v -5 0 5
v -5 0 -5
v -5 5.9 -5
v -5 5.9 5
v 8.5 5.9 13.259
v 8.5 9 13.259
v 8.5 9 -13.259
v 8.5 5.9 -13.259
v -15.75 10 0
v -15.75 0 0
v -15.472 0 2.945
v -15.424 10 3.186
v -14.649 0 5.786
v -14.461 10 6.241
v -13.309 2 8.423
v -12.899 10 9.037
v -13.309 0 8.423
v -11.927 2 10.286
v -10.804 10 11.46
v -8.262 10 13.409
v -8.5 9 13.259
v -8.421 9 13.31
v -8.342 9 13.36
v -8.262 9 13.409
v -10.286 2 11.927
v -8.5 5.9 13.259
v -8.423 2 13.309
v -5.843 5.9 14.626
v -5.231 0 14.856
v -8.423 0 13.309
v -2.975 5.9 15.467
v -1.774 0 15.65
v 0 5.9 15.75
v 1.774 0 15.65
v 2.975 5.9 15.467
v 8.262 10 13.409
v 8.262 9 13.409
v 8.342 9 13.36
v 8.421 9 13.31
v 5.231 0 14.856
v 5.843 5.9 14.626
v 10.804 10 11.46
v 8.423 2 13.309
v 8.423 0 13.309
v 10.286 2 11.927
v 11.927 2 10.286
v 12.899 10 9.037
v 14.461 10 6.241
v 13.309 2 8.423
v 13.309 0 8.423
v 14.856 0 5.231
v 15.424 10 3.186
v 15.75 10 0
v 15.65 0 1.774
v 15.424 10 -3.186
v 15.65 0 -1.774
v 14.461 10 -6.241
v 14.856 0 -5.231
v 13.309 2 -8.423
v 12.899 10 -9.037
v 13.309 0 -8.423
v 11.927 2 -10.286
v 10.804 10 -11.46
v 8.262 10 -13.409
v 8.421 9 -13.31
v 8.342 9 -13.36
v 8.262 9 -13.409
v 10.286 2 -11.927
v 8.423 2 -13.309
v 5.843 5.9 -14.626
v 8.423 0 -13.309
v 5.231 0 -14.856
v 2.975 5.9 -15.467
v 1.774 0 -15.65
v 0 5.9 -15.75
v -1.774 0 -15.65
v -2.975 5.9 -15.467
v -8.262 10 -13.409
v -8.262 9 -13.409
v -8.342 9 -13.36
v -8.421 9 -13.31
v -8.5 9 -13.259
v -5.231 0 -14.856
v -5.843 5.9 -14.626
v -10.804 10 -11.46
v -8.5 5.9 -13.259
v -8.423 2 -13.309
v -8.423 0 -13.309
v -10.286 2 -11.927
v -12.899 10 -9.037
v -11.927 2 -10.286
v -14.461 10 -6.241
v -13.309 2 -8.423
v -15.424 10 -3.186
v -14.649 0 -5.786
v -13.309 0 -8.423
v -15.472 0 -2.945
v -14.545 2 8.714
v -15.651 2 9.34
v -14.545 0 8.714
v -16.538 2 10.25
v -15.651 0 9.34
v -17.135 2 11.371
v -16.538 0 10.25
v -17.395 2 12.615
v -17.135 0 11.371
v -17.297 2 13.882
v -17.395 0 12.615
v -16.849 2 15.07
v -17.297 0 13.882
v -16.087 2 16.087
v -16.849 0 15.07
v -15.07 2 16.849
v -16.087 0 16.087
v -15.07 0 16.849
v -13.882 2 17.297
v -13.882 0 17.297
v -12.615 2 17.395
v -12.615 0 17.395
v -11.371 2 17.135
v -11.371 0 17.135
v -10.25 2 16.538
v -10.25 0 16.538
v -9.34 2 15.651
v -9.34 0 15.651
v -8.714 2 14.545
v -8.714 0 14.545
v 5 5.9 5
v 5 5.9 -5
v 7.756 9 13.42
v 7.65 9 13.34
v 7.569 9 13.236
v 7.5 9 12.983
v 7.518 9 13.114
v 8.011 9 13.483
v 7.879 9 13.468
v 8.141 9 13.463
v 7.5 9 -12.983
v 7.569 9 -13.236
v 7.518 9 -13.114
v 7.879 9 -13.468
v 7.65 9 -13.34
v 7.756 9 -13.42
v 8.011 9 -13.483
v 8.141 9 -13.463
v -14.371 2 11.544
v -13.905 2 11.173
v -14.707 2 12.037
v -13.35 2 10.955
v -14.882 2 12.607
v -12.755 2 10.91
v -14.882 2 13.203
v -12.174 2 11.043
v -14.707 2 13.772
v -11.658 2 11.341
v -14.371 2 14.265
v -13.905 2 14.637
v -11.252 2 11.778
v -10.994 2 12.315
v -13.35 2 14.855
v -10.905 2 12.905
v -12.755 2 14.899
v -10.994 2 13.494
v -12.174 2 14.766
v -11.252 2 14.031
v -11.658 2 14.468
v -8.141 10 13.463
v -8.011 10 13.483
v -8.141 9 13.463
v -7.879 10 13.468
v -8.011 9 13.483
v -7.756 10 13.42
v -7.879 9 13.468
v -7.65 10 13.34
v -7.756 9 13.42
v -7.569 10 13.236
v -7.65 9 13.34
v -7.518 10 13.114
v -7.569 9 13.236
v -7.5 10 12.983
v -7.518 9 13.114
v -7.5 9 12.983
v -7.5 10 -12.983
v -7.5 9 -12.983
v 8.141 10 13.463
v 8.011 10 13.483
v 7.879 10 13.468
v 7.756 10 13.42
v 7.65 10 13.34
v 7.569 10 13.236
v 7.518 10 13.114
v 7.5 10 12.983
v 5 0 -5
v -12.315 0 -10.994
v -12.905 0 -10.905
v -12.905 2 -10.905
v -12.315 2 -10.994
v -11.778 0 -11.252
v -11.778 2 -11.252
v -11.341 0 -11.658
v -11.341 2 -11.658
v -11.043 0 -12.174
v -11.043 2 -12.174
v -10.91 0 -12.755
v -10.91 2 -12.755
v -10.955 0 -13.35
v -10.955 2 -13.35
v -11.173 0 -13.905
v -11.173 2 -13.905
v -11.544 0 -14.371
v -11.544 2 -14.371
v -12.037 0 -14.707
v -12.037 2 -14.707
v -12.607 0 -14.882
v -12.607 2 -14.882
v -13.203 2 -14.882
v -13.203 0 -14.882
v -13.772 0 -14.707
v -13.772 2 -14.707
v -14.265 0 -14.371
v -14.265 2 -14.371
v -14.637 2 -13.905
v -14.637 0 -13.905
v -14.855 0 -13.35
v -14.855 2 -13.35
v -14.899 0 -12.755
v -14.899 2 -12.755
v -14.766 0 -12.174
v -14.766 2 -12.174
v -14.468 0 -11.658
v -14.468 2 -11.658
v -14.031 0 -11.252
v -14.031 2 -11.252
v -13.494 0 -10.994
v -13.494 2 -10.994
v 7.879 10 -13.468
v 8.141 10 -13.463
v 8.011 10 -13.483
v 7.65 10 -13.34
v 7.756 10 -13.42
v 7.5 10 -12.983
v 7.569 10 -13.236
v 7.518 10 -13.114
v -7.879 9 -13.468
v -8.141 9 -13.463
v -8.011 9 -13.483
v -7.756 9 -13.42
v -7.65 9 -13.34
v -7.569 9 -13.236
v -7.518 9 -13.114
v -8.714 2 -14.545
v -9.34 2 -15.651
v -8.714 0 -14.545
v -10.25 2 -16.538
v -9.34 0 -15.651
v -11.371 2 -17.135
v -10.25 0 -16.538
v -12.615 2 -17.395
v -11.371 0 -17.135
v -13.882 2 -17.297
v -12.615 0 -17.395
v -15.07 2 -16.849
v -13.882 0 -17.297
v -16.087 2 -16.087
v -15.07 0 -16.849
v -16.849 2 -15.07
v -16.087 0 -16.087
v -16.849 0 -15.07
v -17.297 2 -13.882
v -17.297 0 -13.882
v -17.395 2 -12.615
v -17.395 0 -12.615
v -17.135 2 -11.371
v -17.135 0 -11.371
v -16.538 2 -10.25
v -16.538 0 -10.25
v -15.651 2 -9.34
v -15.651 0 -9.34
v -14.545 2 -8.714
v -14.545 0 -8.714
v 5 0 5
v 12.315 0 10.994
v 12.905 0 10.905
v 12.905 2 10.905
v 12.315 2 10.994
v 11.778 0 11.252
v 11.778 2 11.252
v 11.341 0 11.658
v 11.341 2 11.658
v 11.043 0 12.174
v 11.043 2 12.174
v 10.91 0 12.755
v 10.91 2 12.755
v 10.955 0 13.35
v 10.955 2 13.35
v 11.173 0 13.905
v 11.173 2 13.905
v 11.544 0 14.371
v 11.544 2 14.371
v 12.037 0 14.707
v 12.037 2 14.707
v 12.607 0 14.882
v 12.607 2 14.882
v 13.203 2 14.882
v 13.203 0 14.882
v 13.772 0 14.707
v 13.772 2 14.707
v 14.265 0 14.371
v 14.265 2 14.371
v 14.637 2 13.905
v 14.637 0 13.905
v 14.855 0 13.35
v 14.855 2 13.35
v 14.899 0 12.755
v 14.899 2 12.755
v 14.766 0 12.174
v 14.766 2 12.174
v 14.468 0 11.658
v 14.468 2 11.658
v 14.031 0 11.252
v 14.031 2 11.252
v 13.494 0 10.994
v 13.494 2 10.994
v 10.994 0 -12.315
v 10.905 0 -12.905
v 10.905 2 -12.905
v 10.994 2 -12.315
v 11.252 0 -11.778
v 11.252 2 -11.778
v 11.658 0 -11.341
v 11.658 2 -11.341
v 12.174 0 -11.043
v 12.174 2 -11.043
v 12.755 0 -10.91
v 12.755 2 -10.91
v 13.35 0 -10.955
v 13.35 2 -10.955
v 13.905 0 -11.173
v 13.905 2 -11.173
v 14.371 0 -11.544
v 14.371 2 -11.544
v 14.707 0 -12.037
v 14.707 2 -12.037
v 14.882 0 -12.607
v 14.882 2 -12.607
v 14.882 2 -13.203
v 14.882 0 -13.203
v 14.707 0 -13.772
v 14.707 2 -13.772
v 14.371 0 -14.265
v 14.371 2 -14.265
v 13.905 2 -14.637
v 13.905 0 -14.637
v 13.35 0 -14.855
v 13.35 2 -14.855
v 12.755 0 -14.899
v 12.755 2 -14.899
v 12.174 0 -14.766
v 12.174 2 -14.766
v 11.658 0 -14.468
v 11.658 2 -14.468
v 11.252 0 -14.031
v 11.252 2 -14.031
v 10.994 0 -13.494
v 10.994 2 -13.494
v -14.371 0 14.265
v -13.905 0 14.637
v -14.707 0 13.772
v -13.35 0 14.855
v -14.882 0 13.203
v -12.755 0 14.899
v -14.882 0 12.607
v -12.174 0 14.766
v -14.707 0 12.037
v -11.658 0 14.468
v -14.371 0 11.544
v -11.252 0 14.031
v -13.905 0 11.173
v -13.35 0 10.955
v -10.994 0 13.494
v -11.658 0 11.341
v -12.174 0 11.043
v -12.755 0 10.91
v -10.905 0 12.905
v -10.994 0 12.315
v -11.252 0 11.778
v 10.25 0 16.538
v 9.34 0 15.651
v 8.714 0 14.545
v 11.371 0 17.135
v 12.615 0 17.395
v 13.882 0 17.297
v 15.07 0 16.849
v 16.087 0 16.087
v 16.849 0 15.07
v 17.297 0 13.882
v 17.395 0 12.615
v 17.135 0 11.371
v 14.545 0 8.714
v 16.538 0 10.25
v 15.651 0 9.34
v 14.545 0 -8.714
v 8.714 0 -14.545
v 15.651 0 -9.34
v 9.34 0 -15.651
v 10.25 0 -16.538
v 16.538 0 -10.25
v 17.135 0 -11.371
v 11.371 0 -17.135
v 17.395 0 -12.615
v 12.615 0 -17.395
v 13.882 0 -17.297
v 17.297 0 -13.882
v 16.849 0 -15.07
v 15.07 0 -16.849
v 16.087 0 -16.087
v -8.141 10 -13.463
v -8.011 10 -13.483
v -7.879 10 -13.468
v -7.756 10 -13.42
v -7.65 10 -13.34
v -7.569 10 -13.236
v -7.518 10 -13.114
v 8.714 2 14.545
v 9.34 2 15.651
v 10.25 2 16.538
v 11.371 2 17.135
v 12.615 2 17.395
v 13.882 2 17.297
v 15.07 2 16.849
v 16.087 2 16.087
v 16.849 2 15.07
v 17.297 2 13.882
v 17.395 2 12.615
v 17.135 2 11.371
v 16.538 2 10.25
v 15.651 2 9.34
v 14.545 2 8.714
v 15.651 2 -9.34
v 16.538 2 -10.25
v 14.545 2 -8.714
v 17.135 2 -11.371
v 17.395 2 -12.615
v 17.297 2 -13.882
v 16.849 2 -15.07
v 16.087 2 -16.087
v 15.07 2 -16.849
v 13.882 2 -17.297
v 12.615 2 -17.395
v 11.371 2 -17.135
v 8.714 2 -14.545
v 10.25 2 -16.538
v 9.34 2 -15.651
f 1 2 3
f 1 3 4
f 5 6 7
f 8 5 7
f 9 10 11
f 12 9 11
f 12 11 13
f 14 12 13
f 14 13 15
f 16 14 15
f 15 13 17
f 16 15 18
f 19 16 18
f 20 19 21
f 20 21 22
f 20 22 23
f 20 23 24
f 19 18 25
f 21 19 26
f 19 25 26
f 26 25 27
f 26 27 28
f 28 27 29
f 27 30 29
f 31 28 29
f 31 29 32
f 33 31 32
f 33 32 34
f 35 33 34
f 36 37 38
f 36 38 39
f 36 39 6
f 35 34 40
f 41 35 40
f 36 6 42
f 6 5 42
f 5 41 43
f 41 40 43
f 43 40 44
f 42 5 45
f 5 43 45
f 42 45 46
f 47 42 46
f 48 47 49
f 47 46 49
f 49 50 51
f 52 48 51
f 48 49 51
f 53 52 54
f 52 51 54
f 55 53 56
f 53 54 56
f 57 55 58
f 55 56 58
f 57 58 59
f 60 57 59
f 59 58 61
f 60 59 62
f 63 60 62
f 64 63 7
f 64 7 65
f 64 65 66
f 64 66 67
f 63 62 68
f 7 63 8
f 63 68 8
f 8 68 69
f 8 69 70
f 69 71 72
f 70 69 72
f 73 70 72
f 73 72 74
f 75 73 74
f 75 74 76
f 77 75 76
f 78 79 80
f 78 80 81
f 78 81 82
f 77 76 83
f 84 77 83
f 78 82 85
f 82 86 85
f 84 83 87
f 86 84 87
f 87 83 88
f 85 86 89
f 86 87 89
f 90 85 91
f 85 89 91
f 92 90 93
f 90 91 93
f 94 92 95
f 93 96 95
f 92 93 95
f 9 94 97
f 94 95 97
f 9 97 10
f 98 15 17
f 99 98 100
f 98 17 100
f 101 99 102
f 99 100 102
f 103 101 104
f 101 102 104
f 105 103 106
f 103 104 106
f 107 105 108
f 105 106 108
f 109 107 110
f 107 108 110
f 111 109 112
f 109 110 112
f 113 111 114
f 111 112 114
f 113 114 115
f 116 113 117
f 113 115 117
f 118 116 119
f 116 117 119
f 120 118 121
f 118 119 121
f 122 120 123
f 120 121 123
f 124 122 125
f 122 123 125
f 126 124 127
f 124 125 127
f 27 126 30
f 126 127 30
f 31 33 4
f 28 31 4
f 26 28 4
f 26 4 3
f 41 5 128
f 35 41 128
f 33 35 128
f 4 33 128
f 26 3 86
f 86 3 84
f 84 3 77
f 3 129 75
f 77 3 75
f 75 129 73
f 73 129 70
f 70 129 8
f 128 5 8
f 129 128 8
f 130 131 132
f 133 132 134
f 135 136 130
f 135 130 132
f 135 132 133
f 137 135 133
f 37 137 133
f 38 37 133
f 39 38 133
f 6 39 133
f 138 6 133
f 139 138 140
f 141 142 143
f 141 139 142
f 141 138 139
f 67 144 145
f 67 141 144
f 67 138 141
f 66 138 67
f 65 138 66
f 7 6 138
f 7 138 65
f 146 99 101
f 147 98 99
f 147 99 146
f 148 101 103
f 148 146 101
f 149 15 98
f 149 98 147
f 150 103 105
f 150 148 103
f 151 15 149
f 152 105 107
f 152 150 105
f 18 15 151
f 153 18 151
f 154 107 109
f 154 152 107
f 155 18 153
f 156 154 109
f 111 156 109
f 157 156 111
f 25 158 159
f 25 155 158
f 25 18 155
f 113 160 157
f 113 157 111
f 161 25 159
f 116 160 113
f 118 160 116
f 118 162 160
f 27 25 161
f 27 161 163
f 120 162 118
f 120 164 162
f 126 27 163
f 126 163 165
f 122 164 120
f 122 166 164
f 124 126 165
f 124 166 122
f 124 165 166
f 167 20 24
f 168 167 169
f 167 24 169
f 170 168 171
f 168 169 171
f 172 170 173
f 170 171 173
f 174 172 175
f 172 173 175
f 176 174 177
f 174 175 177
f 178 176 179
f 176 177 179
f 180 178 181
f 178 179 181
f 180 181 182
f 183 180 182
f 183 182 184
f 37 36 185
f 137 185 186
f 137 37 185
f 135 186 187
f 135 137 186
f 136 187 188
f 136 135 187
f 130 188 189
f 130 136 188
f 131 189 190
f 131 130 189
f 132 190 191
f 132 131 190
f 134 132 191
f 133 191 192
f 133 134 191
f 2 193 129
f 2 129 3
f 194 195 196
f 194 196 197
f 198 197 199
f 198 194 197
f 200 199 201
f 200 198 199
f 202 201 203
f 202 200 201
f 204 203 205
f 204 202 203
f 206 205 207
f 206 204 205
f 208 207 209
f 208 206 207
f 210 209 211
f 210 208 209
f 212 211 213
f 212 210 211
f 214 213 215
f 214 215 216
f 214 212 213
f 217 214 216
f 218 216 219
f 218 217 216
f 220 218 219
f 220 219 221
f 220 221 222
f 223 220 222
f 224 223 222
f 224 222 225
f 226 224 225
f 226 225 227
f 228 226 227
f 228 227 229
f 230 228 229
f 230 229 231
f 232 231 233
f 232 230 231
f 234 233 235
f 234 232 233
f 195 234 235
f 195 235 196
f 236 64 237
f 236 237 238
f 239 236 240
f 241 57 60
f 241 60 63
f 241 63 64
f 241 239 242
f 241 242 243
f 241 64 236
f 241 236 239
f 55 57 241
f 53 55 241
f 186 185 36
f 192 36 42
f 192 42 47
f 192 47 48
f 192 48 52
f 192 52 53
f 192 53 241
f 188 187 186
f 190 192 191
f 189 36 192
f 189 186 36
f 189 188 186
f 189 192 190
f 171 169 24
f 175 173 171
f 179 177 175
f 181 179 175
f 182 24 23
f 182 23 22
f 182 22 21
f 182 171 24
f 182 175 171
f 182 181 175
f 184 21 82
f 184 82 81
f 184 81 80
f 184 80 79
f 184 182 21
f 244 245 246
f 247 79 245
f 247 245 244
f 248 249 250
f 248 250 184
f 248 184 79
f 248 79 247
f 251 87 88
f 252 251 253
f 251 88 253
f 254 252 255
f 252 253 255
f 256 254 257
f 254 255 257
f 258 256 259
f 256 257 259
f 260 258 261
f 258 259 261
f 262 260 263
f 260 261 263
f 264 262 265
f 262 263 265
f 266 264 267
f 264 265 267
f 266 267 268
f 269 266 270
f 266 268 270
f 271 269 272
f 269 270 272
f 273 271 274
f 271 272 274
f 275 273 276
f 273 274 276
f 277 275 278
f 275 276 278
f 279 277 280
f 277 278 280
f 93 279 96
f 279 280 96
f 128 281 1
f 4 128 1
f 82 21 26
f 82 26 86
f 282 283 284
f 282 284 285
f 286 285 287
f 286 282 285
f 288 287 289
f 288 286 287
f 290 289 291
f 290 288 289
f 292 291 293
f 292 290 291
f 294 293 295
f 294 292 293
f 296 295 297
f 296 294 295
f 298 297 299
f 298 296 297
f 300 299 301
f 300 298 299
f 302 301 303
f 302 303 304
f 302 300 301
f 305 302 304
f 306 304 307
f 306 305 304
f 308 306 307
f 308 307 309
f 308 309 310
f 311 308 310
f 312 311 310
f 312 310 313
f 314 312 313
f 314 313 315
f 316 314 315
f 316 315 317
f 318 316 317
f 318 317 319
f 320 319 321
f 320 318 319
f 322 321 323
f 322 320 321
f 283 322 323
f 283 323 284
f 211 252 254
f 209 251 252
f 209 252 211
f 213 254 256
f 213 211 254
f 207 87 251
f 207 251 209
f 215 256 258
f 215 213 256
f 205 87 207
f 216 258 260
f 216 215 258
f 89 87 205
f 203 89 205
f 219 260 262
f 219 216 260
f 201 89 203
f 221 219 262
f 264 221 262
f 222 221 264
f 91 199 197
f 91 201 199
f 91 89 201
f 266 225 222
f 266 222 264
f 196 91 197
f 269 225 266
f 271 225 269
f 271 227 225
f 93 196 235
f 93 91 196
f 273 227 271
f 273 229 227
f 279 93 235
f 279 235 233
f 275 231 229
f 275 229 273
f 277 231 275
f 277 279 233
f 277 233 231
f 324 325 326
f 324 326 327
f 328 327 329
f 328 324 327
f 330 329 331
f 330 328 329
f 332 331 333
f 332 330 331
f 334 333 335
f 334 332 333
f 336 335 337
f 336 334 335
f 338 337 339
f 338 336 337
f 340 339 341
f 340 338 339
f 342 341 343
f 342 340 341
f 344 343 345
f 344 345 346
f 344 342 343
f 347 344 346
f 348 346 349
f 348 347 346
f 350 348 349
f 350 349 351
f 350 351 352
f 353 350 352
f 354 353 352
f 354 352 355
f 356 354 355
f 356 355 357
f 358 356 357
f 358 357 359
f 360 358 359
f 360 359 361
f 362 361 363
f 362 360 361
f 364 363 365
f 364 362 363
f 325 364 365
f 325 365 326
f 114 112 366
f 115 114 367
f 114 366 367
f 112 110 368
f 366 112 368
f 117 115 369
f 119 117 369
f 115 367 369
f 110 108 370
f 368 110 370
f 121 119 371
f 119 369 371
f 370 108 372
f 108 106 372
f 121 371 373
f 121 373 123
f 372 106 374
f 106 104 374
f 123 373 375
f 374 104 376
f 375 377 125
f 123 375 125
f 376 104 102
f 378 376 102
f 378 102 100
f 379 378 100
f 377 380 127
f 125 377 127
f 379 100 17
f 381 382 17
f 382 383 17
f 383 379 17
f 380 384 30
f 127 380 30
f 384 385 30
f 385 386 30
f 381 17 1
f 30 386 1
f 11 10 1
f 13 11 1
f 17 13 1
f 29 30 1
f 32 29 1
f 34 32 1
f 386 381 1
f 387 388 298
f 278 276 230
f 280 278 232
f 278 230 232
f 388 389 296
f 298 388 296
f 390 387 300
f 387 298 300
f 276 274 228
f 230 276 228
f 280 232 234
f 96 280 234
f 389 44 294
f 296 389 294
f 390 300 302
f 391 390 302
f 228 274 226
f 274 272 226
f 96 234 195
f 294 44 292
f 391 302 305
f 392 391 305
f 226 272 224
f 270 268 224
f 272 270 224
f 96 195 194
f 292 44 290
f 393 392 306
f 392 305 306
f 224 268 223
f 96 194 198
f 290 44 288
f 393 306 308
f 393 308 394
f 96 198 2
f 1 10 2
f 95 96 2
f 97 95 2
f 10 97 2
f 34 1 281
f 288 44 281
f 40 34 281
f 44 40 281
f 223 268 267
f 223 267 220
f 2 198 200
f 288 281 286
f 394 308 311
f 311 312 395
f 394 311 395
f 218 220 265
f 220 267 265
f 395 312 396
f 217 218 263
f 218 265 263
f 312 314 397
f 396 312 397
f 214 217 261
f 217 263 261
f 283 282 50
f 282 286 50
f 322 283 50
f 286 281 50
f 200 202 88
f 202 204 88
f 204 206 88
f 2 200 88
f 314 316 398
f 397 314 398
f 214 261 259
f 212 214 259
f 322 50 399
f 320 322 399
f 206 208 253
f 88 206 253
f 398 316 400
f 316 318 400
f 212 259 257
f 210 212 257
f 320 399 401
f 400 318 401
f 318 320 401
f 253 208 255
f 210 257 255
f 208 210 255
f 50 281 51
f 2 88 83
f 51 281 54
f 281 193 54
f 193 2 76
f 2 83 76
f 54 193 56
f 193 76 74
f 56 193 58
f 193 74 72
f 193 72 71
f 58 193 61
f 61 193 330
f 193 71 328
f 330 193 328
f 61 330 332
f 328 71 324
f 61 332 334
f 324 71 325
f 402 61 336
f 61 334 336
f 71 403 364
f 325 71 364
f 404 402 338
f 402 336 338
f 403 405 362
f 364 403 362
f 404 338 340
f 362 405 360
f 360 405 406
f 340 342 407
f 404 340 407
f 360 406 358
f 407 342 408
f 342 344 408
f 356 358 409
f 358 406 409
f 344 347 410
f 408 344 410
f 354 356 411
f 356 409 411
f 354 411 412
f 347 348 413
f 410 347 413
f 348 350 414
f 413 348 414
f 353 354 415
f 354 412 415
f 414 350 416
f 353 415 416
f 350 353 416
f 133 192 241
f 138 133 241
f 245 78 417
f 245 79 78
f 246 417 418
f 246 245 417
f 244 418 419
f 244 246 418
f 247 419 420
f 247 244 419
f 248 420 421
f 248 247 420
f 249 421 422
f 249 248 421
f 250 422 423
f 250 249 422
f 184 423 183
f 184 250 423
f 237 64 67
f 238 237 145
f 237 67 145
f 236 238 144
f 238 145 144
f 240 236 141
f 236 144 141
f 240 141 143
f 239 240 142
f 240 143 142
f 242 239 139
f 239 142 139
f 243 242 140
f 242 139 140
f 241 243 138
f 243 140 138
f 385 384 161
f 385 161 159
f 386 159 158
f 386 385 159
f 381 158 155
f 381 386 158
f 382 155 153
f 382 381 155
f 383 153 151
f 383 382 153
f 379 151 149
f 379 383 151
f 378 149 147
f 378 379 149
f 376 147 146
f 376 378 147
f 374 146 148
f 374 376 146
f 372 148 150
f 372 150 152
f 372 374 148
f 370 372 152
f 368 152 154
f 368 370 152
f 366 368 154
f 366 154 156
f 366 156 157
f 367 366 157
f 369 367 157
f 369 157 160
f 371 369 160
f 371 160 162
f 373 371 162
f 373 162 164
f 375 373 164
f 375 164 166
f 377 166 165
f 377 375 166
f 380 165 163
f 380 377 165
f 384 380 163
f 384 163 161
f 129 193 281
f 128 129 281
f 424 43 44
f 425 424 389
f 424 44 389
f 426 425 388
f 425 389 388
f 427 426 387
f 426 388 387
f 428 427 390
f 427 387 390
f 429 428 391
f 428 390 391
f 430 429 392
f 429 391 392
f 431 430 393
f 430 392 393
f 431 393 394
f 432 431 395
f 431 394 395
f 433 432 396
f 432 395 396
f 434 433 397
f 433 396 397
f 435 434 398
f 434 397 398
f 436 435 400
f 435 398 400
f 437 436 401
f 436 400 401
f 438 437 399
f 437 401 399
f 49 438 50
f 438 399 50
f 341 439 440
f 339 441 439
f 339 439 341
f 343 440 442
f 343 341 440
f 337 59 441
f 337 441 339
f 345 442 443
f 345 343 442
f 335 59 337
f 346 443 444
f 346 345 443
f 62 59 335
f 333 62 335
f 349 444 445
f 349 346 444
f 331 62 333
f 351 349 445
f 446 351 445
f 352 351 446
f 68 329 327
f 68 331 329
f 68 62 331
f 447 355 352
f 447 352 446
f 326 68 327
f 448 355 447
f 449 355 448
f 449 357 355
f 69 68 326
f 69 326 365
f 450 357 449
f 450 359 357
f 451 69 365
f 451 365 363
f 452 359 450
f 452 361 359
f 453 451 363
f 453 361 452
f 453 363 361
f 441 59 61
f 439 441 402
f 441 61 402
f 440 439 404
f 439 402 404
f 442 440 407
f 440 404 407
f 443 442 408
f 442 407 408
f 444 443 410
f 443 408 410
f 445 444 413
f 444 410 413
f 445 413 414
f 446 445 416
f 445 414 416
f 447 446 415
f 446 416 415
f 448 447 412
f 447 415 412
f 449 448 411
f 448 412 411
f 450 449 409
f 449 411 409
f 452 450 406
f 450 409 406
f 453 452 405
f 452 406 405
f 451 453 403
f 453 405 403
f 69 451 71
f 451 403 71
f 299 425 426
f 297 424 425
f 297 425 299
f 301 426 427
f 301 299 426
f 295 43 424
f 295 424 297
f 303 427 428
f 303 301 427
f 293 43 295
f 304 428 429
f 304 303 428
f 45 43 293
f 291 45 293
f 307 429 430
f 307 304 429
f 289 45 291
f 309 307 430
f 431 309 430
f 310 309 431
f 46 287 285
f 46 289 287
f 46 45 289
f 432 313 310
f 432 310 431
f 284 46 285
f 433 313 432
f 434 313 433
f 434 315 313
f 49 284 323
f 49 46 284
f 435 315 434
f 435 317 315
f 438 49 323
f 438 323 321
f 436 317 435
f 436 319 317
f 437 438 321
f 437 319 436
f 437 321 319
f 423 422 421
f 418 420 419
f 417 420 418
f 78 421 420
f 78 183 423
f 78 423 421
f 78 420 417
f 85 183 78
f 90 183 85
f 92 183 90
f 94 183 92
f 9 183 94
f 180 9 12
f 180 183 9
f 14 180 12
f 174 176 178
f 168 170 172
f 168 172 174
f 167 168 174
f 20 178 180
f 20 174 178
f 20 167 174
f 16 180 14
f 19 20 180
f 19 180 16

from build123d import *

# Parameters (mm, degrees)
CYLINDER008_R         = 15.75
CYLINDER008_DEPTH     = 10
CYLINDER009_R         = 4.5
CYLINDER009_DEPTH     = 2
POLARPATTERN002_COUNT = 4
CYLINDER010_R         = 2
CYLINDER010_DEPTH     = 2
POLARPATTERN003_COUNT = 4
BOX001_W              = 10
BOX001_H              = 10
BOX001_DEPTH          = 10
BOX003_W              = 32.5
BOX003_H              = 17
BOX003_DEPTH          = 3.1
BOX004_W              = 32.5
BOX004_H              = 15
BOX004_DEPTH          = 1
FILLET005_R           = 0.5


with BuildPart() as part:
    # Cylinder008 → Cylinder008 (join)
    with BuildSketch(Plane(origin=(0, 0, 0), x_dir=(-1, 0, 0), z_dir=(0, 1, 0))):
        Circle(CYLINDER008_R)
    extrude(amount=CYLINDER008_DEPTH)

    # Cylinder009 → Cylinder009 (join)
    with BuildSketch(Plane(origin=(12.904699, 0, -12.904699), x_dir=(0, 0, -1), z_dir=(0, 1, 0))):
        Circle(CYLINDER009_R)
    cylinder009 = extrude(amount=CYLINDER009_DEPTH)

    # PolarPattern002: Cylinder009 ×4 about axis
    polarpattern002_axis = Axis((0, 0, 0), (0, 1, 0))
    for i in range(1, POLARPATTERN002_COUNT):
        add(cylinder009.rotate(polarpattern002_axis, i * 360 / POLARPATTERN002_COUNT))

    # Cylinder010 → Cylinder010 (cut)
    with BuildSketch(Plane(origin=(12.904699, 0, 12.904699), x_dir=(0, 0, -1), z_dir=(0, 1, 0))):
        Circle(CYLINDER010_R)
    cylinder010 = extrude(amount=CYLINDER010_DEPTH, mode=Mode.SUBTRACT)

    # PolarPattern003: Cylinder010 ×4 about axis
    polarpattern003_axis = Axis((0, 0, 0), (0, 1, 0))
    for i in range(1, POLARPATTERN003_COUNT):
        add(cylinder010.rotate(polarpattern003_axis, i * 360 / POLARPATTERN003_COUNT), mode=Mode.SUBTRACT)

    # Box001 → Box001 (cut)
    with BuildSketch(Plane(origin=(5, 0, -5), x_dir=(-1, 0, 0), z_dir=(0, 1, 0))):
        with Locations((5, 5)):
            Rectangle(BOX001_W, BOX001_H)
    extrude(amount=BOX001_DEPTH, mode=Mode.SUBTRACT)

    # Box003 → Box003 (cut)
    with BuildSketch(Plane(origin=(-8.5, 9, 16.25), x_dir=(0, 0, -1), z_dir=(0, -1, 0))):
        with Locations((16.25, 8.5)):
            Rectangle(BOX003_W, BOX003_H)
    extrude(amount=BOX003_DEPTH, mode=Mode.SUBTRACT)

    # Box004 → Box004 (cut)
    with BuildSketch(Plane(origin=(-7.5, 10, 16.25), x_dir=(0, 0, -1), z_dir=(0, -1, 0))):
        with Locations((16.25, 7.5)):
            Rectangle(BOX004_W, BOX004_H)
    extrude(amount=BOX004_DEPTH, mode=Mode.SUBTRACT)

    # Fillet005
    fillet005_edges = [part.edges().sort_by_distance(p)[0] for p in [
        (-7.5, 9.5, -13.849639),
        (7.5, 9.5, 13.849639),
        (-7.5, 9.5, 13.849639),
        (7.5, 9.5, -13.849639),
    ]]
    fillet(fillet005_edges, radius=FILLET005_R)


solid = part.part
